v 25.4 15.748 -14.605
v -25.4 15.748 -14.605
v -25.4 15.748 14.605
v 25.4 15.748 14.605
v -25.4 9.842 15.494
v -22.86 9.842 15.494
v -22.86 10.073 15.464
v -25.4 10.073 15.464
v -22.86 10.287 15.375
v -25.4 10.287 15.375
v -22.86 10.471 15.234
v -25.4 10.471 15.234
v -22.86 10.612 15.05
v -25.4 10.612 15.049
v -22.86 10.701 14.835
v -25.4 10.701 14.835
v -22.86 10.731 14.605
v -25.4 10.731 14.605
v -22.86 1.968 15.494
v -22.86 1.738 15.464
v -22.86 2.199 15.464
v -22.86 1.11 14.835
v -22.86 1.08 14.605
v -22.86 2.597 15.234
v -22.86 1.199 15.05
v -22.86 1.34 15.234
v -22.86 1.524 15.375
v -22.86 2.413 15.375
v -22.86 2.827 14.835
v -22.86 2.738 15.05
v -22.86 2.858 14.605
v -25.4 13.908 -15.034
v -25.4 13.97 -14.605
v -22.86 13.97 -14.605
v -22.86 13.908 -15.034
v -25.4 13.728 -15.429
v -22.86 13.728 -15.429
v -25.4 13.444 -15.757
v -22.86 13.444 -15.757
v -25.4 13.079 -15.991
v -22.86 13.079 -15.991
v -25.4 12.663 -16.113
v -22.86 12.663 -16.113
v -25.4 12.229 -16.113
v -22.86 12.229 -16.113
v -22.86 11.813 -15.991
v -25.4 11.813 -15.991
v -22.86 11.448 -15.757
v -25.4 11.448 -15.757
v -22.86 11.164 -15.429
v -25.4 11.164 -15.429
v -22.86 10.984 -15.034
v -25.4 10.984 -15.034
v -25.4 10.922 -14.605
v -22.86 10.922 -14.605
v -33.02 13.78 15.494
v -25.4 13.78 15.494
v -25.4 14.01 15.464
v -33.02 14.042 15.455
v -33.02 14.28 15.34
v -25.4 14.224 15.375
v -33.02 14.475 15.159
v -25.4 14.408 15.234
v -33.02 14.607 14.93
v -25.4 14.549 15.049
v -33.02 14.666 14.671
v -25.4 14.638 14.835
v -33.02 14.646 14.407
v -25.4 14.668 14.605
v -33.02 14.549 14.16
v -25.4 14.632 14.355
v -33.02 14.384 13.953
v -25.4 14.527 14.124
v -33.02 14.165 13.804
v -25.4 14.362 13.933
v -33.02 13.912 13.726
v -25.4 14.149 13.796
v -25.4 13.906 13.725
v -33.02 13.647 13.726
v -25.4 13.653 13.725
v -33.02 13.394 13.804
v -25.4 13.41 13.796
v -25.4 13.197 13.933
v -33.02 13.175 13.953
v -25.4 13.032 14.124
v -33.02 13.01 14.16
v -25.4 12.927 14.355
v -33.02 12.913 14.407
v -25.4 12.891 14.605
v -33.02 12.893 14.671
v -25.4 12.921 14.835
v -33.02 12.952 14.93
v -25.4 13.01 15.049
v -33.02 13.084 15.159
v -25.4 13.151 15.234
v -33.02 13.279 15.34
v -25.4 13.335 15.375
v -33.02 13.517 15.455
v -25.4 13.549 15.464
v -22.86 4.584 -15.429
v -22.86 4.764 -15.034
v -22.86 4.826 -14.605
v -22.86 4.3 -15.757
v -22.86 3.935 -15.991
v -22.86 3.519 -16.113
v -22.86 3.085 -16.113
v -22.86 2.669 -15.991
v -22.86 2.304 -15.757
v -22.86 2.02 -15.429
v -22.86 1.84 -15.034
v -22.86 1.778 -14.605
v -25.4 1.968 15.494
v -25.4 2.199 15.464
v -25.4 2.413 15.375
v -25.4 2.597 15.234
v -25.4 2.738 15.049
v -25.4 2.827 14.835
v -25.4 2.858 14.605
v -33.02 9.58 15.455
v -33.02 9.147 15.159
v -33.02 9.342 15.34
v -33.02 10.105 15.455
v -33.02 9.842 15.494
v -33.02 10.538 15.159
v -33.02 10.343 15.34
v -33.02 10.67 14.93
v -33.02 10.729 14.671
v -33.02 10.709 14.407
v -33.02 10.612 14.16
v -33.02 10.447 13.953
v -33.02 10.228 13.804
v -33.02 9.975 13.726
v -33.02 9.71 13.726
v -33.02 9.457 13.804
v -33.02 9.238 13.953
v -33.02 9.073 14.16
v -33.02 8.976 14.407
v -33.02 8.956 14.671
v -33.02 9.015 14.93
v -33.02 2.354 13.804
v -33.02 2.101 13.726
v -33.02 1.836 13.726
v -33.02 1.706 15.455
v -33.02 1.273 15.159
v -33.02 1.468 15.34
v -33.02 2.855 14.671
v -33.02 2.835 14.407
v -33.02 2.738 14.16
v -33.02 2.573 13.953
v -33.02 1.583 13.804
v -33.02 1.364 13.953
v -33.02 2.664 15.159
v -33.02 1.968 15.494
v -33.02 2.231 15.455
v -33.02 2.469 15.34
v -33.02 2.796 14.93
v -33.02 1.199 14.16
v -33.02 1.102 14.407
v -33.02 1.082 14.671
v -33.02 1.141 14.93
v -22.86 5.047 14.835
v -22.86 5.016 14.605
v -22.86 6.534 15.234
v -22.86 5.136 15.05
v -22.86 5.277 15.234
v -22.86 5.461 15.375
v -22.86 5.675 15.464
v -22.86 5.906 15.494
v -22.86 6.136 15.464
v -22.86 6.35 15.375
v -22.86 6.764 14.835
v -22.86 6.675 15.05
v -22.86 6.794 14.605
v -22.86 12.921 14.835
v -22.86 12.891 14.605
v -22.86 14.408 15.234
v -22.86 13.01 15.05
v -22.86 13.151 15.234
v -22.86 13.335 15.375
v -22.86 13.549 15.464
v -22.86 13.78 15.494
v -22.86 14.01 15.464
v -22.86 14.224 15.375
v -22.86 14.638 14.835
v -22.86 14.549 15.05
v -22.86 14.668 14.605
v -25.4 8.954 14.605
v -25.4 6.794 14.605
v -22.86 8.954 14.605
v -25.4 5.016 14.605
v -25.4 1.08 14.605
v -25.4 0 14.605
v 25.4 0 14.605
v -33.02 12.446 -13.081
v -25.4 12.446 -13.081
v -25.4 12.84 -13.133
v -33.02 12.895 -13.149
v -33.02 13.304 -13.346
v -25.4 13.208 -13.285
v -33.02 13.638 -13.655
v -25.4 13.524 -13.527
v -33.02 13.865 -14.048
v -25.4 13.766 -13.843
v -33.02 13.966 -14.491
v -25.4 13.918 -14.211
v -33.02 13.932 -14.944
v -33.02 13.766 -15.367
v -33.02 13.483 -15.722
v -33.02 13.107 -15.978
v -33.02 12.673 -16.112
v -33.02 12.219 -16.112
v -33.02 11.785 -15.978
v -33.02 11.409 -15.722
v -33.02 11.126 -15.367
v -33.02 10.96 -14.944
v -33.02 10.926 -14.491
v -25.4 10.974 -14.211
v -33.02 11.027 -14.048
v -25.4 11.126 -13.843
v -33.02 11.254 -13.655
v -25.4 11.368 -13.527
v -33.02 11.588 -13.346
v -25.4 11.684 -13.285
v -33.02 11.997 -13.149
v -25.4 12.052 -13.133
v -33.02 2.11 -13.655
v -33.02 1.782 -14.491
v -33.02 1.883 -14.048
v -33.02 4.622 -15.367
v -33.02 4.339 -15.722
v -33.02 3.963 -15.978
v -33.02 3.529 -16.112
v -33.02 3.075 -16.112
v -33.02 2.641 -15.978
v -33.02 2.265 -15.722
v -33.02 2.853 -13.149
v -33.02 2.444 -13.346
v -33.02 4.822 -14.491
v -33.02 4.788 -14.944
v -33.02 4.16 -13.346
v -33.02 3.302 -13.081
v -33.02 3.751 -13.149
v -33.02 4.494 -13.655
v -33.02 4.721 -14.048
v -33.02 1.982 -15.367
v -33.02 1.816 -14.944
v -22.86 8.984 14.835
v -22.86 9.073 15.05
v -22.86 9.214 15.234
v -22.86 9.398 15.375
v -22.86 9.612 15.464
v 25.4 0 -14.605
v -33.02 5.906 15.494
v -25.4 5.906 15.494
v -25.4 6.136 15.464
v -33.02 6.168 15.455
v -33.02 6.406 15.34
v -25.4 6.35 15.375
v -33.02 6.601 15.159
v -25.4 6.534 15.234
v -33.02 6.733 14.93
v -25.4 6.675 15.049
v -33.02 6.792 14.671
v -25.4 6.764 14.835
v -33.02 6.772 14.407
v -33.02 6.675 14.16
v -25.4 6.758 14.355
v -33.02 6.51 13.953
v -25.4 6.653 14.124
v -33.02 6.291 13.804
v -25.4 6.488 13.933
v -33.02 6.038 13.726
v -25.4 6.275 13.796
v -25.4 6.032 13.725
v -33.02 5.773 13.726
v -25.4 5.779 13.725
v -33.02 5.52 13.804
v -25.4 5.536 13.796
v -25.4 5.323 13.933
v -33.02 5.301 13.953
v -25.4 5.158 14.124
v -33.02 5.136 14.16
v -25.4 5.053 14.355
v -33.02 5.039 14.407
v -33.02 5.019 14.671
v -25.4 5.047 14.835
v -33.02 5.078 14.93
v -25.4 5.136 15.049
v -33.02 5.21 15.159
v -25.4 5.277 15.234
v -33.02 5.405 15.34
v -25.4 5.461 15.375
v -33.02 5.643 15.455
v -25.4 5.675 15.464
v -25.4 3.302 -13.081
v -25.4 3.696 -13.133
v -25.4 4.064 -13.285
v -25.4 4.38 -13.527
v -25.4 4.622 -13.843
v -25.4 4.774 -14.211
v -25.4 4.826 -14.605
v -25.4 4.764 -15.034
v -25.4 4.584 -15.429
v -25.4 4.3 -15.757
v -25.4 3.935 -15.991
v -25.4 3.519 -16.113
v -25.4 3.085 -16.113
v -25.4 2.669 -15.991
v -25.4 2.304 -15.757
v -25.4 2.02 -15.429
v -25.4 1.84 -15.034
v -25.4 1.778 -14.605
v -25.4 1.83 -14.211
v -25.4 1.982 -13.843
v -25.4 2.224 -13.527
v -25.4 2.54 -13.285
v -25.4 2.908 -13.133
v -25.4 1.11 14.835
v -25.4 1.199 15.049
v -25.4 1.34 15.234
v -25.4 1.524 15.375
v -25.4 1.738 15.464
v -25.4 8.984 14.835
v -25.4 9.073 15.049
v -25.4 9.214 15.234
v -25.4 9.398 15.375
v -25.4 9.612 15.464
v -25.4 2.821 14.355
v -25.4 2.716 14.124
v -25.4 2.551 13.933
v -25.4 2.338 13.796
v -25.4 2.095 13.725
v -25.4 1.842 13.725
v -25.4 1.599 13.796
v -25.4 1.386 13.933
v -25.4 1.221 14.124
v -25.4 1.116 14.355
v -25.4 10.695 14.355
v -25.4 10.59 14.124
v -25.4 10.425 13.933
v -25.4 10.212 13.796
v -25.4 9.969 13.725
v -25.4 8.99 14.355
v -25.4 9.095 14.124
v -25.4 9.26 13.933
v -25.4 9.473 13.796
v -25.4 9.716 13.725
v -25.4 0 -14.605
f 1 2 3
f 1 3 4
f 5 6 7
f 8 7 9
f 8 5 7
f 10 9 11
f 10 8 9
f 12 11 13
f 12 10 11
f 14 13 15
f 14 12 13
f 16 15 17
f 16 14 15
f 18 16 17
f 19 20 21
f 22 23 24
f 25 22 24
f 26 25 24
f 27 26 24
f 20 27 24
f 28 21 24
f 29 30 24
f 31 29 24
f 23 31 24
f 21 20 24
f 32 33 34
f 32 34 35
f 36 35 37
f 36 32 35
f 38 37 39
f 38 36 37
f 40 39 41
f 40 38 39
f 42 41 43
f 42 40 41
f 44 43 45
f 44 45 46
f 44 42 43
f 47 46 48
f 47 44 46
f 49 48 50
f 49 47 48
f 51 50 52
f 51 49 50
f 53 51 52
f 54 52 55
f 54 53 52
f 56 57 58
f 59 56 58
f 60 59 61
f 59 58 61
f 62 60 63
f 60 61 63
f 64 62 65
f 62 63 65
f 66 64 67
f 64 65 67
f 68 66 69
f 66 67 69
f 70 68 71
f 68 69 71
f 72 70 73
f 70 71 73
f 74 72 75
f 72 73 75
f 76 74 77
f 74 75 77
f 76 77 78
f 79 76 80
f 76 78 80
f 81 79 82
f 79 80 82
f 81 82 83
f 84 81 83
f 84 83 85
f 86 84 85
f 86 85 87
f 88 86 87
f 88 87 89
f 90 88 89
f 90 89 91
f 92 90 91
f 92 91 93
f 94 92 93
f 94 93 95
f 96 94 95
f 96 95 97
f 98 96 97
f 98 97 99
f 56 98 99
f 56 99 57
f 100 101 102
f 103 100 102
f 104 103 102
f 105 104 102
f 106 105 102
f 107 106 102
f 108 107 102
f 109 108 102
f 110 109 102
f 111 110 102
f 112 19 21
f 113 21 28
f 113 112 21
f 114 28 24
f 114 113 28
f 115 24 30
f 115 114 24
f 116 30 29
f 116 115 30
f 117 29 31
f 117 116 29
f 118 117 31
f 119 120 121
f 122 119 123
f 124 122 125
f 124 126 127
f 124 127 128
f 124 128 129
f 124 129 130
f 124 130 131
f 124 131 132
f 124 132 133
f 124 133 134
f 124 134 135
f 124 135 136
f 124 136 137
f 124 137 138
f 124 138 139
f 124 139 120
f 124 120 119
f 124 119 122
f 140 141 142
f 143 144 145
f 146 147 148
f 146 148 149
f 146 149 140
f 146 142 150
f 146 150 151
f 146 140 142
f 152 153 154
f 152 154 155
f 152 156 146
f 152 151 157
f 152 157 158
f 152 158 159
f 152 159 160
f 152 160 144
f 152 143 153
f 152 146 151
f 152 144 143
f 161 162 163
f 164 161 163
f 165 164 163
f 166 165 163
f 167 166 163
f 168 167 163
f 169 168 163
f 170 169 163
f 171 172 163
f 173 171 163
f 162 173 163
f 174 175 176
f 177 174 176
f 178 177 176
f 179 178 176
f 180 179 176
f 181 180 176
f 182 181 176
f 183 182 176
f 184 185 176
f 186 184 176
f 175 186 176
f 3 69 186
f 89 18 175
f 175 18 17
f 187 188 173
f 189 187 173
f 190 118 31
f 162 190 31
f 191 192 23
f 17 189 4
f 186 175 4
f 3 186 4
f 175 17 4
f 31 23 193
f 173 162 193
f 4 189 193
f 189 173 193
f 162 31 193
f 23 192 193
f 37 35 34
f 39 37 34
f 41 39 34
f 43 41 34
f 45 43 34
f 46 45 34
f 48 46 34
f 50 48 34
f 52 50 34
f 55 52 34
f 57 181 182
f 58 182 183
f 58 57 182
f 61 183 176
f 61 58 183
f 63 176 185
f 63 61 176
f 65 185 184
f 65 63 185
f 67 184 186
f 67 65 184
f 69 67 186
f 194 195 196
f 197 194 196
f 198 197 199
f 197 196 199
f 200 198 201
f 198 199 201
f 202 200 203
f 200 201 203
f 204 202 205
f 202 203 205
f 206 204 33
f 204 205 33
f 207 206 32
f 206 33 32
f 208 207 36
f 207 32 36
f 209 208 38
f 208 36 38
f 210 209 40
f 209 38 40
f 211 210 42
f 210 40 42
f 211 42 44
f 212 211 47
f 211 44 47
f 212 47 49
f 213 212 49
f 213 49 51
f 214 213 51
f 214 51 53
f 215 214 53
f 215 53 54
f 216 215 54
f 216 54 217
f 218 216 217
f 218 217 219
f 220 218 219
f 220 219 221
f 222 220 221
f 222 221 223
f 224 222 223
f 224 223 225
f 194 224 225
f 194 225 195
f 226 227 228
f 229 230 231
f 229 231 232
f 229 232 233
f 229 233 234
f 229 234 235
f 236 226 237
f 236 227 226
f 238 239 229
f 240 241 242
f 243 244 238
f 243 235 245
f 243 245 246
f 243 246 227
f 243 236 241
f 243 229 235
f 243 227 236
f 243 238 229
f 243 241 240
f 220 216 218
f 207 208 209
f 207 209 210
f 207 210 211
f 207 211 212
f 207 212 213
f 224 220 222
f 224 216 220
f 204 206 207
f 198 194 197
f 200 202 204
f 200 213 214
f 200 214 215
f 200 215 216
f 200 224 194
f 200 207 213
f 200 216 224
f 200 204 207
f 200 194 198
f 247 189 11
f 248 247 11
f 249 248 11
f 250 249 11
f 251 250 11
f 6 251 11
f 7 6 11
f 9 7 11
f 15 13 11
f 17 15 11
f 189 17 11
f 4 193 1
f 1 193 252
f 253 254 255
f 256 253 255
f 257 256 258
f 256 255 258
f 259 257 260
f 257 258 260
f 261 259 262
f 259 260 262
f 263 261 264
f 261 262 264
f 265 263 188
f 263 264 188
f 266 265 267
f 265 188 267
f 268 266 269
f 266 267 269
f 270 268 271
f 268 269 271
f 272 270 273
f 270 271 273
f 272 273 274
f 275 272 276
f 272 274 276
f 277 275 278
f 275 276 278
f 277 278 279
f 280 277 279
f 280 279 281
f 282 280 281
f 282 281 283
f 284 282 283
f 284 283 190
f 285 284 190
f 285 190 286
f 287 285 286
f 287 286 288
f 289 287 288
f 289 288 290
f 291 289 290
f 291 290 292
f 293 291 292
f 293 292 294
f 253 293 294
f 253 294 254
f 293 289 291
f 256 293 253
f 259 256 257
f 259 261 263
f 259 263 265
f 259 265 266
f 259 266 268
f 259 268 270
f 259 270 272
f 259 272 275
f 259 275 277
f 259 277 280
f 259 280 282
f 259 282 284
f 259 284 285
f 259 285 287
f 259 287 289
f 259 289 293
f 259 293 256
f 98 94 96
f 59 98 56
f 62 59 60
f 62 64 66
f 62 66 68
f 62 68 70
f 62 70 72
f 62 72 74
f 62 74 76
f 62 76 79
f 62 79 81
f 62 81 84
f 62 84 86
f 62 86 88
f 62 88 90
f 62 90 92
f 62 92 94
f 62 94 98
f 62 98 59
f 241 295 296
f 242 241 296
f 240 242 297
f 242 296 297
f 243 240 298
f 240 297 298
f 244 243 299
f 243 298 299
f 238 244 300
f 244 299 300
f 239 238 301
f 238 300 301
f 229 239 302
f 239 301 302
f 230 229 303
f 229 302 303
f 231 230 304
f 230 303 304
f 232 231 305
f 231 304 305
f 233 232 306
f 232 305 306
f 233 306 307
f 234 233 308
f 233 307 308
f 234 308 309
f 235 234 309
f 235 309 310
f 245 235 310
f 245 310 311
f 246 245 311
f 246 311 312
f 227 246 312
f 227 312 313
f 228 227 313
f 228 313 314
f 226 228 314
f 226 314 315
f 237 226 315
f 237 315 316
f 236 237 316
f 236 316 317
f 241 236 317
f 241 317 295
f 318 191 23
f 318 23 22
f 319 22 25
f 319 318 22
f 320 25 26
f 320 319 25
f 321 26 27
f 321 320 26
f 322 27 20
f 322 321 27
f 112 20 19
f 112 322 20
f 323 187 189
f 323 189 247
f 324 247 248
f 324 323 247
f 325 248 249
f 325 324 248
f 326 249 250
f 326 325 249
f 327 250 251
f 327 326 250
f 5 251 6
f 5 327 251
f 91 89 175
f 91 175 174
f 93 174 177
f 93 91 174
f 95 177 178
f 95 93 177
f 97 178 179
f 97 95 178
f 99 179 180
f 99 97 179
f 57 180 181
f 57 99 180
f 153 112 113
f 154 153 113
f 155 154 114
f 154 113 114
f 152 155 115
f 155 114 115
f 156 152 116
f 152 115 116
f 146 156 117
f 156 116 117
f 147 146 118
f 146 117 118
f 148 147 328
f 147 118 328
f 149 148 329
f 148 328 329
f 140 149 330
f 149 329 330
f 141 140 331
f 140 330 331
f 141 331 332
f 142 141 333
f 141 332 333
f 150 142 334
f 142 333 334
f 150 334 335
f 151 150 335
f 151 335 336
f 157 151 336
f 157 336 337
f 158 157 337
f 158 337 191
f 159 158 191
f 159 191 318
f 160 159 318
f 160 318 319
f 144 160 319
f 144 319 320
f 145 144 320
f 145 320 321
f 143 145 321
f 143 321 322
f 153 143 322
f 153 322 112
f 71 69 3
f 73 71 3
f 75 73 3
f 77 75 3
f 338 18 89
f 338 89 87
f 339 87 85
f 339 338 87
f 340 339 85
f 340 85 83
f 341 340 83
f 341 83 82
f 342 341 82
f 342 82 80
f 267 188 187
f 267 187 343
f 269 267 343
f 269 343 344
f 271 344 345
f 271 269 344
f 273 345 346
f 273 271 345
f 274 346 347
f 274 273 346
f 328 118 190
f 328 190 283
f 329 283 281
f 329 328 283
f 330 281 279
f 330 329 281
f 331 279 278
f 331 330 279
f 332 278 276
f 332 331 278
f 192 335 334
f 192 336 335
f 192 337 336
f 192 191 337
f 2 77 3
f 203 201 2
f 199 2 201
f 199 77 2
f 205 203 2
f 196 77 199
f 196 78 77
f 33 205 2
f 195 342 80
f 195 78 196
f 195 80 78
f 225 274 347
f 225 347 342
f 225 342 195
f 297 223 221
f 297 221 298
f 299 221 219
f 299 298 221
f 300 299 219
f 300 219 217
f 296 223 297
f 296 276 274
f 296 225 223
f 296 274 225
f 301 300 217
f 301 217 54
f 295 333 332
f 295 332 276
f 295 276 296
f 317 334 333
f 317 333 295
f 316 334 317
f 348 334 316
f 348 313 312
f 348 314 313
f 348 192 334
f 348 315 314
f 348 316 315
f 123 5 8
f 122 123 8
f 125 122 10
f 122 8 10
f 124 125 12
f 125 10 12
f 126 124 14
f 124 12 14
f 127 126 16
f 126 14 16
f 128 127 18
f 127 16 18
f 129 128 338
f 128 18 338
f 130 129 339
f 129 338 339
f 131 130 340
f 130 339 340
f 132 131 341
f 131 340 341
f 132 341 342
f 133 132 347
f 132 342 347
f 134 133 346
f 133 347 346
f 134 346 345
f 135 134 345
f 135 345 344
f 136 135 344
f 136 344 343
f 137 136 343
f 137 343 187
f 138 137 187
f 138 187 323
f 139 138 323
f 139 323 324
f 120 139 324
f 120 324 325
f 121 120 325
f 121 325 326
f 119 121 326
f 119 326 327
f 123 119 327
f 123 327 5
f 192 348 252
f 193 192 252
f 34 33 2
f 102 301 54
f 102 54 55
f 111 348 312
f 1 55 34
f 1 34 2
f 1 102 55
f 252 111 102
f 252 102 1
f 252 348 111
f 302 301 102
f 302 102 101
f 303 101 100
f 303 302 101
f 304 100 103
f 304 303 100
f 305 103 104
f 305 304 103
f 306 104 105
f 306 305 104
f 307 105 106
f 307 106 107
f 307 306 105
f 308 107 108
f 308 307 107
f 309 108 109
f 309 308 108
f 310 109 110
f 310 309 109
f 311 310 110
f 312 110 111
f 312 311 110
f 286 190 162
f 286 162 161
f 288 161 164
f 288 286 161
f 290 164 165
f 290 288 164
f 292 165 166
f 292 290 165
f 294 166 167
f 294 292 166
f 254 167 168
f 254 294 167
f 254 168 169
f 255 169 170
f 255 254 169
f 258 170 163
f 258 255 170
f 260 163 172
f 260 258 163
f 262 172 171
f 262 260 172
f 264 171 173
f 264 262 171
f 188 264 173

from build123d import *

# Parameters (mm, degrees)
SKETCH1_W                = 50.8
SKETCH1_H                = 29.21
BOSS_EXTRUDE1_DEPTH      = 15.748
SKETCH2_R                = 1.524
SKETCH2_R_2              = 0.889
BOSS_EXTRUDE2_DEPTH      = 7.62
BOSS_EXTRUDE2_DEPTH_BACK = 2.54


with BuildPart() as part:
    # Sketch1 → Boss-Extrude1 (new body)
    with BuildSketch(Plane(origin=(0, 0, 0), x_dir=(1, 0, 0), z_dir=(0, 1, 0))):
        Rectangle(SKETCH1_W, SKETCH1_H)
    extrude(amount=BOSS_EXTRUDE1_DEPTH)

    # Sketch2 → Boss-Extrude2 (add, two sides)
    with BuildSketch(Plane.ZY.offset(25.4)) as boss_extrude2_sk:
        with Locations((-14.605, 12.446)):
            Circle(SKETCH2_R)
        with Locations((14.605, 9.8425)):
            Circle(SKETCH2_R_2)
        with Locations((14.605, 13.7795)):
            Circle(SKETCH2_R_2)
        with Locations((14.605, 5.9055)):
            Circle(SKETCH2_R_2)
        with Locations((14.605, 1.9685)):
            Circle(SKETCH2_R_2)
        with Locations((-14.605, 3.302)):
            Circle(SKETCH2_R)
    extrude(amount=BOSS_EXTRUDE2_DEPTH)
    extrude(boss_extrude2_sk.sketch, amount=-BOSS_EXTRUDE2_DEPTH_BACK)


solid = part.part
